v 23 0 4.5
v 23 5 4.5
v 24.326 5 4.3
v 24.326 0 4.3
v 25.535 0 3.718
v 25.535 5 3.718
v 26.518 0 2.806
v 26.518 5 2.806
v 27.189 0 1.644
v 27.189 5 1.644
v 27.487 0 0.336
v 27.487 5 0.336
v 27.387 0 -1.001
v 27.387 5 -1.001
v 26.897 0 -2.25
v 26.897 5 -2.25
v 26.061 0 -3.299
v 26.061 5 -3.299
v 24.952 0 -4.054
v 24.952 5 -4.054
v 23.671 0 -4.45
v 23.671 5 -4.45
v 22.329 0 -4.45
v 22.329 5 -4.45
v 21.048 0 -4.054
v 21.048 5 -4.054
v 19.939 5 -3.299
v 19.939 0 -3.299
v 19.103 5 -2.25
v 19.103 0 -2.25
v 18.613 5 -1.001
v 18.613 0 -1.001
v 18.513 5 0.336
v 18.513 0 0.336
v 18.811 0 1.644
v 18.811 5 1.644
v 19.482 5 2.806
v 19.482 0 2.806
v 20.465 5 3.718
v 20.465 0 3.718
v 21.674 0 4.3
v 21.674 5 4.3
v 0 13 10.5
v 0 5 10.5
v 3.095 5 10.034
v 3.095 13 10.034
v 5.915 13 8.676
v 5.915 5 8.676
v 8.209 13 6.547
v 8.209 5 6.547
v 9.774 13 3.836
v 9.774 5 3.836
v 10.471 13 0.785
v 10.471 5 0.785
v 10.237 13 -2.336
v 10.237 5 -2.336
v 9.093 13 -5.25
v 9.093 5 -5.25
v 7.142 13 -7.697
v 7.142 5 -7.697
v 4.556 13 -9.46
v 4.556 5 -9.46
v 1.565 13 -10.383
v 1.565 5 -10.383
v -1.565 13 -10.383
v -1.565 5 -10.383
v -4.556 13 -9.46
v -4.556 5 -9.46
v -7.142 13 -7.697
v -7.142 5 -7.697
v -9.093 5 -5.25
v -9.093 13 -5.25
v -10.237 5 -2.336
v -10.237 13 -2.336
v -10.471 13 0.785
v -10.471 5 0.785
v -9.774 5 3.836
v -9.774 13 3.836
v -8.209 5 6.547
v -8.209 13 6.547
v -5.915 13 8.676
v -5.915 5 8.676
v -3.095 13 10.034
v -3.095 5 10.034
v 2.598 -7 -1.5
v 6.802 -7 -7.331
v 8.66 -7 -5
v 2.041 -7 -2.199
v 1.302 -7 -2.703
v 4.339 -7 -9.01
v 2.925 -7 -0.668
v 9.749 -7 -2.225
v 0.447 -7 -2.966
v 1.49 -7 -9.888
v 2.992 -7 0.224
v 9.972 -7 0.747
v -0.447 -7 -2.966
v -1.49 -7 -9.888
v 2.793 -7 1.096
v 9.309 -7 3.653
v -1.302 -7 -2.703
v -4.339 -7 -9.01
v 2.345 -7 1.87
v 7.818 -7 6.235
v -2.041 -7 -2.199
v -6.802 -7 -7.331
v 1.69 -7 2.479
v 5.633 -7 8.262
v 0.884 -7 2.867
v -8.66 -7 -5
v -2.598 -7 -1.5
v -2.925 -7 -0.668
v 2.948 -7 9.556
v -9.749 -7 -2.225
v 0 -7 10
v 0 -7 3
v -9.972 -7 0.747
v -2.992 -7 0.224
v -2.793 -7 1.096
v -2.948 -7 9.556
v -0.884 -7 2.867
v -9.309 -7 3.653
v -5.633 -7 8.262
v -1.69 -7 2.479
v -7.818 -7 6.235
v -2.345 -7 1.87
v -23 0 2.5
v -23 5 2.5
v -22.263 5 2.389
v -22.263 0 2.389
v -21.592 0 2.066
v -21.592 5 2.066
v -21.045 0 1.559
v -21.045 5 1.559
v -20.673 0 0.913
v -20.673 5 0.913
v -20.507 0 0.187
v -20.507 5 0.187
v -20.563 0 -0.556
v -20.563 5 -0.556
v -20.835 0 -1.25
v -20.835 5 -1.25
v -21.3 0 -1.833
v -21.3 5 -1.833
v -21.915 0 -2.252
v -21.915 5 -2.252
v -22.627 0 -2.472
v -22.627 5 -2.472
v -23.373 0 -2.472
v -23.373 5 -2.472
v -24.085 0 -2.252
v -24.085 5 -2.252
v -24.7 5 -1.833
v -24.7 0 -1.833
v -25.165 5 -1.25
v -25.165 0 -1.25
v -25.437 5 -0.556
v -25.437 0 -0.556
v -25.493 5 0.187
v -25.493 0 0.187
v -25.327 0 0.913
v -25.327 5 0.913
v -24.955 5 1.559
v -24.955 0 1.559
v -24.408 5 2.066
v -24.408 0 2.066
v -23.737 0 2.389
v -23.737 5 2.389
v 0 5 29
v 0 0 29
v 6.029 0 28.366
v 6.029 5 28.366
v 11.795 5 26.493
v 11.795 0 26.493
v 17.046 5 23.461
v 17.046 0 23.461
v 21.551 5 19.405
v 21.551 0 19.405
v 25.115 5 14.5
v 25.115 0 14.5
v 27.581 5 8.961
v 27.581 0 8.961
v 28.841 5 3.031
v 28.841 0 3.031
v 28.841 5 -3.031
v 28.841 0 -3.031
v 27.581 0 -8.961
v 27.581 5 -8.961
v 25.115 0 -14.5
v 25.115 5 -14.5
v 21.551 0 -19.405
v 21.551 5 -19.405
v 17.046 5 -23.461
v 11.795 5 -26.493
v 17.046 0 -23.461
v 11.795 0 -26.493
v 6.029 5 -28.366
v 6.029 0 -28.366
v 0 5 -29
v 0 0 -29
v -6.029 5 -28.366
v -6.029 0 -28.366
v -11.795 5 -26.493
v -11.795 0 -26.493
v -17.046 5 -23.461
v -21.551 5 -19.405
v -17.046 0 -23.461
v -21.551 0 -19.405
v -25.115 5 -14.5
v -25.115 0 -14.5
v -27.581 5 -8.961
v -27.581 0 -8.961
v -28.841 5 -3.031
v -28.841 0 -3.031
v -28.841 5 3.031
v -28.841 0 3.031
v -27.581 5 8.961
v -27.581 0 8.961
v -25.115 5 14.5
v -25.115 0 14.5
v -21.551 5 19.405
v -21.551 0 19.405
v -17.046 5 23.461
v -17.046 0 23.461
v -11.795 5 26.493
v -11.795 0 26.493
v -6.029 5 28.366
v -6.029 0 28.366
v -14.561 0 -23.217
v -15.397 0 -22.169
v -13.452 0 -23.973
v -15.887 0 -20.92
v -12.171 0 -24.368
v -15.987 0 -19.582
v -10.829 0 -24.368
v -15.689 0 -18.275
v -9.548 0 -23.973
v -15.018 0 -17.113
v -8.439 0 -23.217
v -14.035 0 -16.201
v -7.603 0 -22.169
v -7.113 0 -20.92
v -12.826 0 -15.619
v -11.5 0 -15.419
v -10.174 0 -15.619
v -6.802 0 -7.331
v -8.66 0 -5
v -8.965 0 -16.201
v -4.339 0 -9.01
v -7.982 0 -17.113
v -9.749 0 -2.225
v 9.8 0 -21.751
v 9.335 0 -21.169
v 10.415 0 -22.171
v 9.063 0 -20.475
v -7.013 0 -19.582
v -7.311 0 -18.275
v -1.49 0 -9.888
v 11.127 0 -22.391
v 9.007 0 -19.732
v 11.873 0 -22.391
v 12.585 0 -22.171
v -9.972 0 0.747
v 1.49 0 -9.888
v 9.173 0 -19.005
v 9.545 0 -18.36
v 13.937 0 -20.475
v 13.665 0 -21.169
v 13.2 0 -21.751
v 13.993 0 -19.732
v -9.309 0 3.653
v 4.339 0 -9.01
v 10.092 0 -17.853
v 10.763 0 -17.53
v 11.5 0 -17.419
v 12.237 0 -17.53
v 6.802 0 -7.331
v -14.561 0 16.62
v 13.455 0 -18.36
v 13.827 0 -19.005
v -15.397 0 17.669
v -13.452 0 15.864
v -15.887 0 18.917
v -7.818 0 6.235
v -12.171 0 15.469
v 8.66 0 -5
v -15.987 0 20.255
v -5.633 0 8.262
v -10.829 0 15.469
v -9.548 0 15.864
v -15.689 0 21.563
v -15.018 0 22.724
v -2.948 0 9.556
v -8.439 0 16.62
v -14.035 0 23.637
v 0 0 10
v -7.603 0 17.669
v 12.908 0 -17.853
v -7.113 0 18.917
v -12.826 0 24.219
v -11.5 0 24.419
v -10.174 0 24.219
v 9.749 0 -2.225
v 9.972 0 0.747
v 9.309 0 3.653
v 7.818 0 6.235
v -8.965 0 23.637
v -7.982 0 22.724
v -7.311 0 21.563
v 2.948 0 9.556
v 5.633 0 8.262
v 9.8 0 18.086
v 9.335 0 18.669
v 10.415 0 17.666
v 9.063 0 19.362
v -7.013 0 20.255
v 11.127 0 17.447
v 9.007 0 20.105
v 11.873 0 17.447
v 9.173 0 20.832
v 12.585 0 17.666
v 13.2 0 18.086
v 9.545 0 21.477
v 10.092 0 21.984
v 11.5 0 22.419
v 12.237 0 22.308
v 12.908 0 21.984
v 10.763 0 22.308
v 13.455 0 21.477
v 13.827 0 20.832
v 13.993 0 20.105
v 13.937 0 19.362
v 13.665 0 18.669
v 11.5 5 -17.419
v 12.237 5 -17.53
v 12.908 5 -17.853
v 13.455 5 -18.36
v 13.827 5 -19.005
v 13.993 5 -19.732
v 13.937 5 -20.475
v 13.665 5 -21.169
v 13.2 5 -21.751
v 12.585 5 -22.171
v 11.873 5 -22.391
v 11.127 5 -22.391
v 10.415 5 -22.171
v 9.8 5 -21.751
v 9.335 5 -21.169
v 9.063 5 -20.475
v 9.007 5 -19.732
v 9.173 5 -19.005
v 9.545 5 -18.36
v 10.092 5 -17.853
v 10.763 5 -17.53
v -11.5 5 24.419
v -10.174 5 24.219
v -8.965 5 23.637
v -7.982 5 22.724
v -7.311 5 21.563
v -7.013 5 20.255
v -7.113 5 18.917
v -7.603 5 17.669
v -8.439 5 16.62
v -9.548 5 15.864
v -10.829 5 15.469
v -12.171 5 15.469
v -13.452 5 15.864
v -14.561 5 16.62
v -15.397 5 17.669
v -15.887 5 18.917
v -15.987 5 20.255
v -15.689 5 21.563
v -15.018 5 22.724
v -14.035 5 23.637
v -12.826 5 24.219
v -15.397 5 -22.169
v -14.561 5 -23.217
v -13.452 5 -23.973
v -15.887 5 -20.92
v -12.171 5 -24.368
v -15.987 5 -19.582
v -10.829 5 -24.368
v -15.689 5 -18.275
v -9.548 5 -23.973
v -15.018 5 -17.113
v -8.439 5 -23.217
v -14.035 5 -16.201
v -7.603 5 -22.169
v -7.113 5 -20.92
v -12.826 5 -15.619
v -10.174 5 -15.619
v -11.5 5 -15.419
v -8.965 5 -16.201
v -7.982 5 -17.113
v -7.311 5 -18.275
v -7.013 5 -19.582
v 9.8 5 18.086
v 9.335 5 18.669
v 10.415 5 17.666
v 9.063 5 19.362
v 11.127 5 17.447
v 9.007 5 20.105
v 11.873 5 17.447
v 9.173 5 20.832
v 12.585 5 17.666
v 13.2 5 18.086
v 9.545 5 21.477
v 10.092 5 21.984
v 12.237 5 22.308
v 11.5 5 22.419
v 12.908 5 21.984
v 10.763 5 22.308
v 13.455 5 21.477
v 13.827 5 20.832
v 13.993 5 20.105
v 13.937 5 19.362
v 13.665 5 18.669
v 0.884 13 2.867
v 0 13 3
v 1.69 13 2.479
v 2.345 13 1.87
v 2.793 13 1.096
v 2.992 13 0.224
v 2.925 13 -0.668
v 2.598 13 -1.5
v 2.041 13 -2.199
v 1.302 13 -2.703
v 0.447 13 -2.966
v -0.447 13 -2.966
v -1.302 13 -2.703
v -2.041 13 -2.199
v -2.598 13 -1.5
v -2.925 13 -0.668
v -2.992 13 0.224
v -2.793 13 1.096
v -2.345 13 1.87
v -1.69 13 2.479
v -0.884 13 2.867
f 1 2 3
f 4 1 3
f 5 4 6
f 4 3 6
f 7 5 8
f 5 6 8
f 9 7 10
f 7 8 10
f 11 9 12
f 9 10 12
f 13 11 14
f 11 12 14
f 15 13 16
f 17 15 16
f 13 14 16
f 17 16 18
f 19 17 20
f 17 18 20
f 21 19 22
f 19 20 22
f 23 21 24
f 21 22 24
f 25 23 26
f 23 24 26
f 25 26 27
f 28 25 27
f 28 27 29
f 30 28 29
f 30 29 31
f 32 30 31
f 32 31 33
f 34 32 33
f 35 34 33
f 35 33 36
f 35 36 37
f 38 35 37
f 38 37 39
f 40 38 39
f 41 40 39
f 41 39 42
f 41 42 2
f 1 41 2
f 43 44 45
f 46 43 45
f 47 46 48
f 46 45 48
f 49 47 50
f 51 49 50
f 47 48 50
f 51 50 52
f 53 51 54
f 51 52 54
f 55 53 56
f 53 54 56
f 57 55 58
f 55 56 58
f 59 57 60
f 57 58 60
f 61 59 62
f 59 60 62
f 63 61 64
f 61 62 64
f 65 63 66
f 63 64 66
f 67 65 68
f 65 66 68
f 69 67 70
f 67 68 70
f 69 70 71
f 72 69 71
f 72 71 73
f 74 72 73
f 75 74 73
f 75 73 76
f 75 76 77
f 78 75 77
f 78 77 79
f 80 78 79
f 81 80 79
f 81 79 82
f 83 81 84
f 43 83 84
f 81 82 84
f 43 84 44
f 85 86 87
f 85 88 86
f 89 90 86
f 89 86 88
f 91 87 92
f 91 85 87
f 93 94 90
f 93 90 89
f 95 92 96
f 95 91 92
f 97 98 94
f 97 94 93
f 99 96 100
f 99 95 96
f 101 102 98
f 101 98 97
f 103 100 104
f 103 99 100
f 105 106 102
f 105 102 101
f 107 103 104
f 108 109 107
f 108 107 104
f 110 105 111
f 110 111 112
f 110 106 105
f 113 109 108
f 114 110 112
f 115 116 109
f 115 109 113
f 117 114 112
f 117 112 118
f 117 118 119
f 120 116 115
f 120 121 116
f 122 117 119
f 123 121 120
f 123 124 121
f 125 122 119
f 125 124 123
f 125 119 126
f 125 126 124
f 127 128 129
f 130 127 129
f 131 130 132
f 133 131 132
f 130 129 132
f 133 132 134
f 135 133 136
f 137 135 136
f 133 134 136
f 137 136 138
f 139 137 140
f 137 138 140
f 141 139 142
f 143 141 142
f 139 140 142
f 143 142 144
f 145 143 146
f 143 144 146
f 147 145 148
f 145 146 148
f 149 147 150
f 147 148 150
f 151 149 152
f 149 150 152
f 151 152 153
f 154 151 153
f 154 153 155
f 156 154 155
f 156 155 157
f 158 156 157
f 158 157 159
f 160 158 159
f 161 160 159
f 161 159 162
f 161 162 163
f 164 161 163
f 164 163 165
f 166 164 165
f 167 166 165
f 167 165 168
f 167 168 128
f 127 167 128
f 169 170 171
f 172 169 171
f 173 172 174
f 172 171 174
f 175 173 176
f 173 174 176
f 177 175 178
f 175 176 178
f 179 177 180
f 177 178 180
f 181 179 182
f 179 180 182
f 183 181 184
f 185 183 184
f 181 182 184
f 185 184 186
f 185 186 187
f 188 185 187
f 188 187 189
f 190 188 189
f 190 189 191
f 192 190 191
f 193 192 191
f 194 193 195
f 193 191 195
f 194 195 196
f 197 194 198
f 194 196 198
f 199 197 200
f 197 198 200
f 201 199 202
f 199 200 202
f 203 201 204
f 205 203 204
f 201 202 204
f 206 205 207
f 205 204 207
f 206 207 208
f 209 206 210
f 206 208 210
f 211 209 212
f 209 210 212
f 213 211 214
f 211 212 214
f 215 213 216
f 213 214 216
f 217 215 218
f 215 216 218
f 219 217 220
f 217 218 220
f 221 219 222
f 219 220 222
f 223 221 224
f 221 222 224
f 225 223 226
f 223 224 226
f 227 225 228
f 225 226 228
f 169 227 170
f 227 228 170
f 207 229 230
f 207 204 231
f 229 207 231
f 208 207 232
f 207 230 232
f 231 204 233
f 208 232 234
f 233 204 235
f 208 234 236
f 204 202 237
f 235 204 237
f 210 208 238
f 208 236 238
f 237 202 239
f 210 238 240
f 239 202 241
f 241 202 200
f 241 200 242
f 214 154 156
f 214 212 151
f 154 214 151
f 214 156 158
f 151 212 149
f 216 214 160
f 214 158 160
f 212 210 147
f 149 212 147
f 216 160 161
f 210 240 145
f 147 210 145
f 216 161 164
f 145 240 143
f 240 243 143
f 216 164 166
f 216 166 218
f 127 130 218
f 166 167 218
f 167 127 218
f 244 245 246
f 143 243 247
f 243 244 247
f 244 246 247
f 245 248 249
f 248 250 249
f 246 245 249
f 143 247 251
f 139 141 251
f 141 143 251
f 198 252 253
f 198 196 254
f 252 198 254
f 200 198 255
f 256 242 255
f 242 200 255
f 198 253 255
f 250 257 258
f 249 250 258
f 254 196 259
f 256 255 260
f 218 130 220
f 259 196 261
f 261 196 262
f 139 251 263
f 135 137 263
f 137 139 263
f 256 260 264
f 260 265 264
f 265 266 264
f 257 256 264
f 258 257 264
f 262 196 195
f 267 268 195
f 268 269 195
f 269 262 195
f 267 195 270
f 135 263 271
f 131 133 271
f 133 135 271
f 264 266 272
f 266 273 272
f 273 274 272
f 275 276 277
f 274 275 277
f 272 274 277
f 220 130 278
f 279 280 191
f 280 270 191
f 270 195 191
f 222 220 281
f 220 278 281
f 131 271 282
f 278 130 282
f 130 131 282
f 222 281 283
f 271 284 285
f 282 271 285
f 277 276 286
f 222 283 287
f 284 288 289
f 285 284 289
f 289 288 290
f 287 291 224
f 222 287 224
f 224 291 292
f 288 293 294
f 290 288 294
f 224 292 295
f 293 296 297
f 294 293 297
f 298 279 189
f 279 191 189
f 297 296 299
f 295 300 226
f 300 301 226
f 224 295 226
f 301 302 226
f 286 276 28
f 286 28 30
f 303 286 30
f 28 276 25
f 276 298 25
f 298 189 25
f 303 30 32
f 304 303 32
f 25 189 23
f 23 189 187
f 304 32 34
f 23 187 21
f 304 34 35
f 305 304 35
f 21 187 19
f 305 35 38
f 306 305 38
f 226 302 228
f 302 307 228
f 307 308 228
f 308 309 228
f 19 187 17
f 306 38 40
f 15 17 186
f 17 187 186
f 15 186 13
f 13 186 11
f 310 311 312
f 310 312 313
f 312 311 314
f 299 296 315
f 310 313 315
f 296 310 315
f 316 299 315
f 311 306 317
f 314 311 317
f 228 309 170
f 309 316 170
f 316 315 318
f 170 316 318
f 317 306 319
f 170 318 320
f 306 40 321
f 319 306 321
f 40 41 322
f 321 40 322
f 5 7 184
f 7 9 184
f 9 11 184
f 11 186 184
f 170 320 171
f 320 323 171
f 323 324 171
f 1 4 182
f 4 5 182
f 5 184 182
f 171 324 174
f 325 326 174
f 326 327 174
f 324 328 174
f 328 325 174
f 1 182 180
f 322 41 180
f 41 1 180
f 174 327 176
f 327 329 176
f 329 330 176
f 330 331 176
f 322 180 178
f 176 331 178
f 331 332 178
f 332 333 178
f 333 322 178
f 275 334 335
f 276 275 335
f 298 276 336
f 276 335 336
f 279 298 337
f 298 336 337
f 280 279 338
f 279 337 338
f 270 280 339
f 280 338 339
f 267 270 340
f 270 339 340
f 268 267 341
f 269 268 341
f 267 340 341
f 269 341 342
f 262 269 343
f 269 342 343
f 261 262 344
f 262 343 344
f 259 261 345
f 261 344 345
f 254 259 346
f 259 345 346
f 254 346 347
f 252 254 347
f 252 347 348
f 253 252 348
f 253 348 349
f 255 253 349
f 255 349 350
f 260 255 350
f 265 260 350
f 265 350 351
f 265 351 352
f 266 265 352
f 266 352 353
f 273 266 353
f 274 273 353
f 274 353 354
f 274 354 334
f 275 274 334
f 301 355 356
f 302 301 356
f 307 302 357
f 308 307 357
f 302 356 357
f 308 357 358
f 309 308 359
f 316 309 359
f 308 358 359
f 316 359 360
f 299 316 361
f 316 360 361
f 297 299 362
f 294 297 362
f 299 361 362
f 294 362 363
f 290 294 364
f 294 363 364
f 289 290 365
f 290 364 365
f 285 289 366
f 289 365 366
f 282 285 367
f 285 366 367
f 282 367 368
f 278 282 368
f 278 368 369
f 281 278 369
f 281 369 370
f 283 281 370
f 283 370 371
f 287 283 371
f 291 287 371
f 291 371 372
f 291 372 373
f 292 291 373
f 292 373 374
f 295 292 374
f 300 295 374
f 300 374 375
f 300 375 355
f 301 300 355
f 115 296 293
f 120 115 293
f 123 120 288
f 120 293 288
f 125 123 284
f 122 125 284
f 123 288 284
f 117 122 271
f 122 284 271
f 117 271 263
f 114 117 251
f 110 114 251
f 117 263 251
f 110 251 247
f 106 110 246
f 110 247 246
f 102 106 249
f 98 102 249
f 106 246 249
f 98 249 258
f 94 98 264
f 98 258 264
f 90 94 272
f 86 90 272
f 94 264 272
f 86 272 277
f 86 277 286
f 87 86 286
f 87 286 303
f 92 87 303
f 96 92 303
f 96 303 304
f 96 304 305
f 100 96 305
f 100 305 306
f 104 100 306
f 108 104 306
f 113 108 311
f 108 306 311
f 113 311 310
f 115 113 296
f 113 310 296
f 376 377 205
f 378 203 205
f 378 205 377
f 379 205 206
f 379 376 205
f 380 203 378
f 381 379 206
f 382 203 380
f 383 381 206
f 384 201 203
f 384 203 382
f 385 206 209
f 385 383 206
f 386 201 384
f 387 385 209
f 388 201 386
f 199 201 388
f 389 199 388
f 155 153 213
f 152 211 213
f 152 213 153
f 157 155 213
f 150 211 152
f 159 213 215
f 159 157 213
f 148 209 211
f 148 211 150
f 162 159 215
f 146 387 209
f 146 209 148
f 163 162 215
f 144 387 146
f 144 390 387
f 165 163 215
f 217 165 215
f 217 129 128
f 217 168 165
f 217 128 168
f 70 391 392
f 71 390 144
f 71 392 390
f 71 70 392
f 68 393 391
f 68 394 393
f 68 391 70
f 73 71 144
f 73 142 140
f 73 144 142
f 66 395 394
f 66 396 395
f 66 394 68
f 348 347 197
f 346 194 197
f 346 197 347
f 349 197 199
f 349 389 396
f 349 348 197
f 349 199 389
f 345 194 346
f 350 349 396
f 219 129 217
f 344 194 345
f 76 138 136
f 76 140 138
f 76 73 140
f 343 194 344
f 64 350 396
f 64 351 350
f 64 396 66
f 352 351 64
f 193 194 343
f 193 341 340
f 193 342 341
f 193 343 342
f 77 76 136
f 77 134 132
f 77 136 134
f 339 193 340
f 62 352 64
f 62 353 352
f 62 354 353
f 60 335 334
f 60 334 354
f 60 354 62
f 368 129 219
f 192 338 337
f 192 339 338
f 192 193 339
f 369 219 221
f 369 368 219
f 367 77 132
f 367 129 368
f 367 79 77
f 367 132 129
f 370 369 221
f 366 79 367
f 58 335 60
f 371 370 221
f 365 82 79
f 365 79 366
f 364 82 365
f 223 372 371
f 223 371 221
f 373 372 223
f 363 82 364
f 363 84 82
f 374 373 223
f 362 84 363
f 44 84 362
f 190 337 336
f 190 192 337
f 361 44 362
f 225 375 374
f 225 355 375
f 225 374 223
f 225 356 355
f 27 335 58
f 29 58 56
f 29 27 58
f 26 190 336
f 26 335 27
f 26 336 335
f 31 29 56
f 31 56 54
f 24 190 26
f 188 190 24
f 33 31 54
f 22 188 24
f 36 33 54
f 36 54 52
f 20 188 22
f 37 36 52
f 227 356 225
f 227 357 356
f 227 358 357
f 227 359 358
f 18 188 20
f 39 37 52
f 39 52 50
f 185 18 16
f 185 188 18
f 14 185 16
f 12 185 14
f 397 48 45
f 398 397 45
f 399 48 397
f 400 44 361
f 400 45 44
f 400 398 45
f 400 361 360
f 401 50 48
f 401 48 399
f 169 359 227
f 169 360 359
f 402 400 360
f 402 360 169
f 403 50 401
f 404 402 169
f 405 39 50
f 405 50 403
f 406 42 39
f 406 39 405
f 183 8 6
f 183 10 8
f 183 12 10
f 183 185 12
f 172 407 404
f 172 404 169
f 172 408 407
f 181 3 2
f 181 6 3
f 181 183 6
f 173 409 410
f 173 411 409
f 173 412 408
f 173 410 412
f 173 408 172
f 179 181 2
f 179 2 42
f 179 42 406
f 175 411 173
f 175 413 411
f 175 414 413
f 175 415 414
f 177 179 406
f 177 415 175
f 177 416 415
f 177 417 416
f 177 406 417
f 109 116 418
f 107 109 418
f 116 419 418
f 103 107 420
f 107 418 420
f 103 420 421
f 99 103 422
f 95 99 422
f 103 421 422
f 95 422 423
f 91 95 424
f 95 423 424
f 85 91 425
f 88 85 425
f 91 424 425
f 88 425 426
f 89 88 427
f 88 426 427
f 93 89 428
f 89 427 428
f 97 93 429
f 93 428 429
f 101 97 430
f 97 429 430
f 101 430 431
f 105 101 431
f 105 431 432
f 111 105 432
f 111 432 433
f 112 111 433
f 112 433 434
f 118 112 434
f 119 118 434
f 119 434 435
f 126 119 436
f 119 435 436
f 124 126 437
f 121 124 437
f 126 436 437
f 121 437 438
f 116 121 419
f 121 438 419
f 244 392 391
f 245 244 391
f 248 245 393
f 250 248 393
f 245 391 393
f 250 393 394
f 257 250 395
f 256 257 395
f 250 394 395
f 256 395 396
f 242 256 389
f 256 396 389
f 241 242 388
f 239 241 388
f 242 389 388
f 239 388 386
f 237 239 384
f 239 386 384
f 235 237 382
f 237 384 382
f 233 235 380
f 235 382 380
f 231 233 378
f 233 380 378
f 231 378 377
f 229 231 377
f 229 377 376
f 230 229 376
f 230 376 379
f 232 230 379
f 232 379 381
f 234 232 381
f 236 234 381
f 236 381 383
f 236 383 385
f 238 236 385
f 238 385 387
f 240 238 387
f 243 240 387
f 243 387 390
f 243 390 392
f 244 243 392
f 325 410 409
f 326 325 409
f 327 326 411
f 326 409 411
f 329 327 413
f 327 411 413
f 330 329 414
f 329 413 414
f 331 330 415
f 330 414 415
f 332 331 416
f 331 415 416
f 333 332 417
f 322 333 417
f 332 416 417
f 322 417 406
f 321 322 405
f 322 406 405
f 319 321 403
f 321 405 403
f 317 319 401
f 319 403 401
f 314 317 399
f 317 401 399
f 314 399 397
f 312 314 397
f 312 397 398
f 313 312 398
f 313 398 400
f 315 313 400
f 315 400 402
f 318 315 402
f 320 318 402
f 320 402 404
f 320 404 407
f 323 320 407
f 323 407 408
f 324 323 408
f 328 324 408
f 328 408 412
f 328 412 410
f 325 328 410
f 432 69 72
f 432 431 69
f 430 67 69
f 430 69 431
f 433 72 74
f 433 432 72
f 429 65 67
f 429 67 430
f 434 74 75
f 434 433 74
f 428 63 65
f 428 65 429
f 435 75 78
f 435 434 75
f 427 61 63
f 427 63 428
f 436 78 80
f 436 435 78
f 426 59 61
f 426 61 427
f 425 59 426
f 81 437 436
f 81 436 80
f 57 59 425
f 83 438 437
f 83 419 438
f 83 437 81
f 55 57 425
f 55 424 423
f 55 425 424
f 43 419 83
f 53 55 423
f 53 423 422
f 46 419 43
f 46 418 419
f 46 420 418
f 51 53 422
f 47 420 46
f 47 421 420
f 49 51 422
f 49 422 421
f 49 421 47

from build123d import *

# Parameters (mm, degrees)
SKETCH1_R           = 29
BOSS_EXTRUDE2_DEPTH = 5
SKETCH3_R           = 10.5
BOSS_EXTRUDE3_DEPTH = 8
SKETCH4_R           = 3
CUT_EXTRUDE1_DEPTH  = 44.023249529
SKETCH6_R           = 10
BOSS_EXTRUDE5_DEPTH = 7
SKETCH8_R           = 3
CUT_EXTRUDE3_DEPTH  = 44.023249529
SKETCH9_R           = 2.5
CUT_EXTRUDE4_DEPTH  = 43.731721238
SKETCH10_R          = 4.5
CUT_EXTRUDE5_DEPTH  = 43.731721238


with BuildPart() as part:
    # Sketch1 → Boss-Extrude2 (new body)
    with BuildSketch(Plane(origin=(0, 0, 0), x_dir=(1, 0, 0), z_dir=(0, 1, 0))):
        with Locations(Location((0, 0, 0), (0, 0, 270))):
            Circle(SKETCH1_R)
    extrude(amount=BOSS_EXTRUDE2_DEPTH)

    # Sketch3 → Boss-Extrude3 (add)
    with BuildSketch(Plane(origin=(0, 5, 0), x_dir=(1, 0, 0), z_dir=(0, 1, 0))):
        with Locations(Location((0, 0, 0), (0, 0, 270))):
            Circle(SKETCH3_R)
    extrude(amount=BOSS_EXTRUDE3_DEPTH)

    # Sketch4 → Cut-Extrude1 (cut, through all)
    with BuildSketch(Plane(origin=(0, 13, 0), x_dir=(1, 0, 0), z_dir=(0, 1, 0))):
        with Locations(Location((0, 0, 0), (0, 0, 270))):
            Circle(SKETCH4_R)
    extrude(amount=-CUT_EXTRUDE1_DEPTH, mode=Mode.SUBTRACT)

    # Sketch6 → Boss-Extrude5 (add)
    with BuildSketch(Plane.XZ):
        with Locations(Location((0, 0, 0), (0, 0, 90))):
            Circle(SKETCH6_R)
    extrude(amount=BOSS_EXTRUDE5_DEPTH)

    # Sketch8 → Cut-Extrude3 (cut, through all)
    with BuildSketch(Plane(origin=(0, 0, 0), x_dir=(1, 0, 0), z_dir=(0, 1, 0))):
        with Locations(Location((0, 0, 0), (0, 0, 270))):
            Circle(SKETCH8_R)
    extrude(amount=-CUT_EXTRUDE3_DEPTH, mode=Mode.SUBTRACT)

    # Sketch9 → Cut-Extrude4 (cut, through all)
    with BuildSketch(Plane(origin=(0, 5, 0), x_dir=(1, 0, 0), z_dir=(0, 1, 0))):
        with Locations(Location((11.5, 19.918584287, 0), (0, 0, 270))):
            Circle(SKETCH9_R)
        with Locations(Location((-23, 0, 0), (0, 0, 270))):
            Circle(SKETCH9_R)
        with Locations(Location((11.5, -19.918584287, 0), (0, 0, 270))):
            Circle(SKETCH9_R)
    extrude(amount=-CUT_EXTRUDE4_DEPTH, mode=Mode.SUBTRACT)

    # Sketch10 → Cut-Extrude5 (cut, through all)
    with BuildSketch(Plane(origin=(0, 5, 0), x_dir=(1, 0, 0), z_dir=(0, 1, 0))):
        with Locations(Location((-11.5, -19.918584287, 0), (0, 0, 270))):
            Circle(SKETCH10_R)
        with Locations(Location((-11.5, 19.918584287, 0), (0, 0, 270))):
            Circle(SKETCH10_R)
        with Locations(Location((23, 0, 0), (0, 0, 270))):
            Circle(SKETCH10_R)
    extrude(amount=-CUT_EXTRUDE5_DEPTH, mode=Mode.SUBTRACT)


solid = part.part
